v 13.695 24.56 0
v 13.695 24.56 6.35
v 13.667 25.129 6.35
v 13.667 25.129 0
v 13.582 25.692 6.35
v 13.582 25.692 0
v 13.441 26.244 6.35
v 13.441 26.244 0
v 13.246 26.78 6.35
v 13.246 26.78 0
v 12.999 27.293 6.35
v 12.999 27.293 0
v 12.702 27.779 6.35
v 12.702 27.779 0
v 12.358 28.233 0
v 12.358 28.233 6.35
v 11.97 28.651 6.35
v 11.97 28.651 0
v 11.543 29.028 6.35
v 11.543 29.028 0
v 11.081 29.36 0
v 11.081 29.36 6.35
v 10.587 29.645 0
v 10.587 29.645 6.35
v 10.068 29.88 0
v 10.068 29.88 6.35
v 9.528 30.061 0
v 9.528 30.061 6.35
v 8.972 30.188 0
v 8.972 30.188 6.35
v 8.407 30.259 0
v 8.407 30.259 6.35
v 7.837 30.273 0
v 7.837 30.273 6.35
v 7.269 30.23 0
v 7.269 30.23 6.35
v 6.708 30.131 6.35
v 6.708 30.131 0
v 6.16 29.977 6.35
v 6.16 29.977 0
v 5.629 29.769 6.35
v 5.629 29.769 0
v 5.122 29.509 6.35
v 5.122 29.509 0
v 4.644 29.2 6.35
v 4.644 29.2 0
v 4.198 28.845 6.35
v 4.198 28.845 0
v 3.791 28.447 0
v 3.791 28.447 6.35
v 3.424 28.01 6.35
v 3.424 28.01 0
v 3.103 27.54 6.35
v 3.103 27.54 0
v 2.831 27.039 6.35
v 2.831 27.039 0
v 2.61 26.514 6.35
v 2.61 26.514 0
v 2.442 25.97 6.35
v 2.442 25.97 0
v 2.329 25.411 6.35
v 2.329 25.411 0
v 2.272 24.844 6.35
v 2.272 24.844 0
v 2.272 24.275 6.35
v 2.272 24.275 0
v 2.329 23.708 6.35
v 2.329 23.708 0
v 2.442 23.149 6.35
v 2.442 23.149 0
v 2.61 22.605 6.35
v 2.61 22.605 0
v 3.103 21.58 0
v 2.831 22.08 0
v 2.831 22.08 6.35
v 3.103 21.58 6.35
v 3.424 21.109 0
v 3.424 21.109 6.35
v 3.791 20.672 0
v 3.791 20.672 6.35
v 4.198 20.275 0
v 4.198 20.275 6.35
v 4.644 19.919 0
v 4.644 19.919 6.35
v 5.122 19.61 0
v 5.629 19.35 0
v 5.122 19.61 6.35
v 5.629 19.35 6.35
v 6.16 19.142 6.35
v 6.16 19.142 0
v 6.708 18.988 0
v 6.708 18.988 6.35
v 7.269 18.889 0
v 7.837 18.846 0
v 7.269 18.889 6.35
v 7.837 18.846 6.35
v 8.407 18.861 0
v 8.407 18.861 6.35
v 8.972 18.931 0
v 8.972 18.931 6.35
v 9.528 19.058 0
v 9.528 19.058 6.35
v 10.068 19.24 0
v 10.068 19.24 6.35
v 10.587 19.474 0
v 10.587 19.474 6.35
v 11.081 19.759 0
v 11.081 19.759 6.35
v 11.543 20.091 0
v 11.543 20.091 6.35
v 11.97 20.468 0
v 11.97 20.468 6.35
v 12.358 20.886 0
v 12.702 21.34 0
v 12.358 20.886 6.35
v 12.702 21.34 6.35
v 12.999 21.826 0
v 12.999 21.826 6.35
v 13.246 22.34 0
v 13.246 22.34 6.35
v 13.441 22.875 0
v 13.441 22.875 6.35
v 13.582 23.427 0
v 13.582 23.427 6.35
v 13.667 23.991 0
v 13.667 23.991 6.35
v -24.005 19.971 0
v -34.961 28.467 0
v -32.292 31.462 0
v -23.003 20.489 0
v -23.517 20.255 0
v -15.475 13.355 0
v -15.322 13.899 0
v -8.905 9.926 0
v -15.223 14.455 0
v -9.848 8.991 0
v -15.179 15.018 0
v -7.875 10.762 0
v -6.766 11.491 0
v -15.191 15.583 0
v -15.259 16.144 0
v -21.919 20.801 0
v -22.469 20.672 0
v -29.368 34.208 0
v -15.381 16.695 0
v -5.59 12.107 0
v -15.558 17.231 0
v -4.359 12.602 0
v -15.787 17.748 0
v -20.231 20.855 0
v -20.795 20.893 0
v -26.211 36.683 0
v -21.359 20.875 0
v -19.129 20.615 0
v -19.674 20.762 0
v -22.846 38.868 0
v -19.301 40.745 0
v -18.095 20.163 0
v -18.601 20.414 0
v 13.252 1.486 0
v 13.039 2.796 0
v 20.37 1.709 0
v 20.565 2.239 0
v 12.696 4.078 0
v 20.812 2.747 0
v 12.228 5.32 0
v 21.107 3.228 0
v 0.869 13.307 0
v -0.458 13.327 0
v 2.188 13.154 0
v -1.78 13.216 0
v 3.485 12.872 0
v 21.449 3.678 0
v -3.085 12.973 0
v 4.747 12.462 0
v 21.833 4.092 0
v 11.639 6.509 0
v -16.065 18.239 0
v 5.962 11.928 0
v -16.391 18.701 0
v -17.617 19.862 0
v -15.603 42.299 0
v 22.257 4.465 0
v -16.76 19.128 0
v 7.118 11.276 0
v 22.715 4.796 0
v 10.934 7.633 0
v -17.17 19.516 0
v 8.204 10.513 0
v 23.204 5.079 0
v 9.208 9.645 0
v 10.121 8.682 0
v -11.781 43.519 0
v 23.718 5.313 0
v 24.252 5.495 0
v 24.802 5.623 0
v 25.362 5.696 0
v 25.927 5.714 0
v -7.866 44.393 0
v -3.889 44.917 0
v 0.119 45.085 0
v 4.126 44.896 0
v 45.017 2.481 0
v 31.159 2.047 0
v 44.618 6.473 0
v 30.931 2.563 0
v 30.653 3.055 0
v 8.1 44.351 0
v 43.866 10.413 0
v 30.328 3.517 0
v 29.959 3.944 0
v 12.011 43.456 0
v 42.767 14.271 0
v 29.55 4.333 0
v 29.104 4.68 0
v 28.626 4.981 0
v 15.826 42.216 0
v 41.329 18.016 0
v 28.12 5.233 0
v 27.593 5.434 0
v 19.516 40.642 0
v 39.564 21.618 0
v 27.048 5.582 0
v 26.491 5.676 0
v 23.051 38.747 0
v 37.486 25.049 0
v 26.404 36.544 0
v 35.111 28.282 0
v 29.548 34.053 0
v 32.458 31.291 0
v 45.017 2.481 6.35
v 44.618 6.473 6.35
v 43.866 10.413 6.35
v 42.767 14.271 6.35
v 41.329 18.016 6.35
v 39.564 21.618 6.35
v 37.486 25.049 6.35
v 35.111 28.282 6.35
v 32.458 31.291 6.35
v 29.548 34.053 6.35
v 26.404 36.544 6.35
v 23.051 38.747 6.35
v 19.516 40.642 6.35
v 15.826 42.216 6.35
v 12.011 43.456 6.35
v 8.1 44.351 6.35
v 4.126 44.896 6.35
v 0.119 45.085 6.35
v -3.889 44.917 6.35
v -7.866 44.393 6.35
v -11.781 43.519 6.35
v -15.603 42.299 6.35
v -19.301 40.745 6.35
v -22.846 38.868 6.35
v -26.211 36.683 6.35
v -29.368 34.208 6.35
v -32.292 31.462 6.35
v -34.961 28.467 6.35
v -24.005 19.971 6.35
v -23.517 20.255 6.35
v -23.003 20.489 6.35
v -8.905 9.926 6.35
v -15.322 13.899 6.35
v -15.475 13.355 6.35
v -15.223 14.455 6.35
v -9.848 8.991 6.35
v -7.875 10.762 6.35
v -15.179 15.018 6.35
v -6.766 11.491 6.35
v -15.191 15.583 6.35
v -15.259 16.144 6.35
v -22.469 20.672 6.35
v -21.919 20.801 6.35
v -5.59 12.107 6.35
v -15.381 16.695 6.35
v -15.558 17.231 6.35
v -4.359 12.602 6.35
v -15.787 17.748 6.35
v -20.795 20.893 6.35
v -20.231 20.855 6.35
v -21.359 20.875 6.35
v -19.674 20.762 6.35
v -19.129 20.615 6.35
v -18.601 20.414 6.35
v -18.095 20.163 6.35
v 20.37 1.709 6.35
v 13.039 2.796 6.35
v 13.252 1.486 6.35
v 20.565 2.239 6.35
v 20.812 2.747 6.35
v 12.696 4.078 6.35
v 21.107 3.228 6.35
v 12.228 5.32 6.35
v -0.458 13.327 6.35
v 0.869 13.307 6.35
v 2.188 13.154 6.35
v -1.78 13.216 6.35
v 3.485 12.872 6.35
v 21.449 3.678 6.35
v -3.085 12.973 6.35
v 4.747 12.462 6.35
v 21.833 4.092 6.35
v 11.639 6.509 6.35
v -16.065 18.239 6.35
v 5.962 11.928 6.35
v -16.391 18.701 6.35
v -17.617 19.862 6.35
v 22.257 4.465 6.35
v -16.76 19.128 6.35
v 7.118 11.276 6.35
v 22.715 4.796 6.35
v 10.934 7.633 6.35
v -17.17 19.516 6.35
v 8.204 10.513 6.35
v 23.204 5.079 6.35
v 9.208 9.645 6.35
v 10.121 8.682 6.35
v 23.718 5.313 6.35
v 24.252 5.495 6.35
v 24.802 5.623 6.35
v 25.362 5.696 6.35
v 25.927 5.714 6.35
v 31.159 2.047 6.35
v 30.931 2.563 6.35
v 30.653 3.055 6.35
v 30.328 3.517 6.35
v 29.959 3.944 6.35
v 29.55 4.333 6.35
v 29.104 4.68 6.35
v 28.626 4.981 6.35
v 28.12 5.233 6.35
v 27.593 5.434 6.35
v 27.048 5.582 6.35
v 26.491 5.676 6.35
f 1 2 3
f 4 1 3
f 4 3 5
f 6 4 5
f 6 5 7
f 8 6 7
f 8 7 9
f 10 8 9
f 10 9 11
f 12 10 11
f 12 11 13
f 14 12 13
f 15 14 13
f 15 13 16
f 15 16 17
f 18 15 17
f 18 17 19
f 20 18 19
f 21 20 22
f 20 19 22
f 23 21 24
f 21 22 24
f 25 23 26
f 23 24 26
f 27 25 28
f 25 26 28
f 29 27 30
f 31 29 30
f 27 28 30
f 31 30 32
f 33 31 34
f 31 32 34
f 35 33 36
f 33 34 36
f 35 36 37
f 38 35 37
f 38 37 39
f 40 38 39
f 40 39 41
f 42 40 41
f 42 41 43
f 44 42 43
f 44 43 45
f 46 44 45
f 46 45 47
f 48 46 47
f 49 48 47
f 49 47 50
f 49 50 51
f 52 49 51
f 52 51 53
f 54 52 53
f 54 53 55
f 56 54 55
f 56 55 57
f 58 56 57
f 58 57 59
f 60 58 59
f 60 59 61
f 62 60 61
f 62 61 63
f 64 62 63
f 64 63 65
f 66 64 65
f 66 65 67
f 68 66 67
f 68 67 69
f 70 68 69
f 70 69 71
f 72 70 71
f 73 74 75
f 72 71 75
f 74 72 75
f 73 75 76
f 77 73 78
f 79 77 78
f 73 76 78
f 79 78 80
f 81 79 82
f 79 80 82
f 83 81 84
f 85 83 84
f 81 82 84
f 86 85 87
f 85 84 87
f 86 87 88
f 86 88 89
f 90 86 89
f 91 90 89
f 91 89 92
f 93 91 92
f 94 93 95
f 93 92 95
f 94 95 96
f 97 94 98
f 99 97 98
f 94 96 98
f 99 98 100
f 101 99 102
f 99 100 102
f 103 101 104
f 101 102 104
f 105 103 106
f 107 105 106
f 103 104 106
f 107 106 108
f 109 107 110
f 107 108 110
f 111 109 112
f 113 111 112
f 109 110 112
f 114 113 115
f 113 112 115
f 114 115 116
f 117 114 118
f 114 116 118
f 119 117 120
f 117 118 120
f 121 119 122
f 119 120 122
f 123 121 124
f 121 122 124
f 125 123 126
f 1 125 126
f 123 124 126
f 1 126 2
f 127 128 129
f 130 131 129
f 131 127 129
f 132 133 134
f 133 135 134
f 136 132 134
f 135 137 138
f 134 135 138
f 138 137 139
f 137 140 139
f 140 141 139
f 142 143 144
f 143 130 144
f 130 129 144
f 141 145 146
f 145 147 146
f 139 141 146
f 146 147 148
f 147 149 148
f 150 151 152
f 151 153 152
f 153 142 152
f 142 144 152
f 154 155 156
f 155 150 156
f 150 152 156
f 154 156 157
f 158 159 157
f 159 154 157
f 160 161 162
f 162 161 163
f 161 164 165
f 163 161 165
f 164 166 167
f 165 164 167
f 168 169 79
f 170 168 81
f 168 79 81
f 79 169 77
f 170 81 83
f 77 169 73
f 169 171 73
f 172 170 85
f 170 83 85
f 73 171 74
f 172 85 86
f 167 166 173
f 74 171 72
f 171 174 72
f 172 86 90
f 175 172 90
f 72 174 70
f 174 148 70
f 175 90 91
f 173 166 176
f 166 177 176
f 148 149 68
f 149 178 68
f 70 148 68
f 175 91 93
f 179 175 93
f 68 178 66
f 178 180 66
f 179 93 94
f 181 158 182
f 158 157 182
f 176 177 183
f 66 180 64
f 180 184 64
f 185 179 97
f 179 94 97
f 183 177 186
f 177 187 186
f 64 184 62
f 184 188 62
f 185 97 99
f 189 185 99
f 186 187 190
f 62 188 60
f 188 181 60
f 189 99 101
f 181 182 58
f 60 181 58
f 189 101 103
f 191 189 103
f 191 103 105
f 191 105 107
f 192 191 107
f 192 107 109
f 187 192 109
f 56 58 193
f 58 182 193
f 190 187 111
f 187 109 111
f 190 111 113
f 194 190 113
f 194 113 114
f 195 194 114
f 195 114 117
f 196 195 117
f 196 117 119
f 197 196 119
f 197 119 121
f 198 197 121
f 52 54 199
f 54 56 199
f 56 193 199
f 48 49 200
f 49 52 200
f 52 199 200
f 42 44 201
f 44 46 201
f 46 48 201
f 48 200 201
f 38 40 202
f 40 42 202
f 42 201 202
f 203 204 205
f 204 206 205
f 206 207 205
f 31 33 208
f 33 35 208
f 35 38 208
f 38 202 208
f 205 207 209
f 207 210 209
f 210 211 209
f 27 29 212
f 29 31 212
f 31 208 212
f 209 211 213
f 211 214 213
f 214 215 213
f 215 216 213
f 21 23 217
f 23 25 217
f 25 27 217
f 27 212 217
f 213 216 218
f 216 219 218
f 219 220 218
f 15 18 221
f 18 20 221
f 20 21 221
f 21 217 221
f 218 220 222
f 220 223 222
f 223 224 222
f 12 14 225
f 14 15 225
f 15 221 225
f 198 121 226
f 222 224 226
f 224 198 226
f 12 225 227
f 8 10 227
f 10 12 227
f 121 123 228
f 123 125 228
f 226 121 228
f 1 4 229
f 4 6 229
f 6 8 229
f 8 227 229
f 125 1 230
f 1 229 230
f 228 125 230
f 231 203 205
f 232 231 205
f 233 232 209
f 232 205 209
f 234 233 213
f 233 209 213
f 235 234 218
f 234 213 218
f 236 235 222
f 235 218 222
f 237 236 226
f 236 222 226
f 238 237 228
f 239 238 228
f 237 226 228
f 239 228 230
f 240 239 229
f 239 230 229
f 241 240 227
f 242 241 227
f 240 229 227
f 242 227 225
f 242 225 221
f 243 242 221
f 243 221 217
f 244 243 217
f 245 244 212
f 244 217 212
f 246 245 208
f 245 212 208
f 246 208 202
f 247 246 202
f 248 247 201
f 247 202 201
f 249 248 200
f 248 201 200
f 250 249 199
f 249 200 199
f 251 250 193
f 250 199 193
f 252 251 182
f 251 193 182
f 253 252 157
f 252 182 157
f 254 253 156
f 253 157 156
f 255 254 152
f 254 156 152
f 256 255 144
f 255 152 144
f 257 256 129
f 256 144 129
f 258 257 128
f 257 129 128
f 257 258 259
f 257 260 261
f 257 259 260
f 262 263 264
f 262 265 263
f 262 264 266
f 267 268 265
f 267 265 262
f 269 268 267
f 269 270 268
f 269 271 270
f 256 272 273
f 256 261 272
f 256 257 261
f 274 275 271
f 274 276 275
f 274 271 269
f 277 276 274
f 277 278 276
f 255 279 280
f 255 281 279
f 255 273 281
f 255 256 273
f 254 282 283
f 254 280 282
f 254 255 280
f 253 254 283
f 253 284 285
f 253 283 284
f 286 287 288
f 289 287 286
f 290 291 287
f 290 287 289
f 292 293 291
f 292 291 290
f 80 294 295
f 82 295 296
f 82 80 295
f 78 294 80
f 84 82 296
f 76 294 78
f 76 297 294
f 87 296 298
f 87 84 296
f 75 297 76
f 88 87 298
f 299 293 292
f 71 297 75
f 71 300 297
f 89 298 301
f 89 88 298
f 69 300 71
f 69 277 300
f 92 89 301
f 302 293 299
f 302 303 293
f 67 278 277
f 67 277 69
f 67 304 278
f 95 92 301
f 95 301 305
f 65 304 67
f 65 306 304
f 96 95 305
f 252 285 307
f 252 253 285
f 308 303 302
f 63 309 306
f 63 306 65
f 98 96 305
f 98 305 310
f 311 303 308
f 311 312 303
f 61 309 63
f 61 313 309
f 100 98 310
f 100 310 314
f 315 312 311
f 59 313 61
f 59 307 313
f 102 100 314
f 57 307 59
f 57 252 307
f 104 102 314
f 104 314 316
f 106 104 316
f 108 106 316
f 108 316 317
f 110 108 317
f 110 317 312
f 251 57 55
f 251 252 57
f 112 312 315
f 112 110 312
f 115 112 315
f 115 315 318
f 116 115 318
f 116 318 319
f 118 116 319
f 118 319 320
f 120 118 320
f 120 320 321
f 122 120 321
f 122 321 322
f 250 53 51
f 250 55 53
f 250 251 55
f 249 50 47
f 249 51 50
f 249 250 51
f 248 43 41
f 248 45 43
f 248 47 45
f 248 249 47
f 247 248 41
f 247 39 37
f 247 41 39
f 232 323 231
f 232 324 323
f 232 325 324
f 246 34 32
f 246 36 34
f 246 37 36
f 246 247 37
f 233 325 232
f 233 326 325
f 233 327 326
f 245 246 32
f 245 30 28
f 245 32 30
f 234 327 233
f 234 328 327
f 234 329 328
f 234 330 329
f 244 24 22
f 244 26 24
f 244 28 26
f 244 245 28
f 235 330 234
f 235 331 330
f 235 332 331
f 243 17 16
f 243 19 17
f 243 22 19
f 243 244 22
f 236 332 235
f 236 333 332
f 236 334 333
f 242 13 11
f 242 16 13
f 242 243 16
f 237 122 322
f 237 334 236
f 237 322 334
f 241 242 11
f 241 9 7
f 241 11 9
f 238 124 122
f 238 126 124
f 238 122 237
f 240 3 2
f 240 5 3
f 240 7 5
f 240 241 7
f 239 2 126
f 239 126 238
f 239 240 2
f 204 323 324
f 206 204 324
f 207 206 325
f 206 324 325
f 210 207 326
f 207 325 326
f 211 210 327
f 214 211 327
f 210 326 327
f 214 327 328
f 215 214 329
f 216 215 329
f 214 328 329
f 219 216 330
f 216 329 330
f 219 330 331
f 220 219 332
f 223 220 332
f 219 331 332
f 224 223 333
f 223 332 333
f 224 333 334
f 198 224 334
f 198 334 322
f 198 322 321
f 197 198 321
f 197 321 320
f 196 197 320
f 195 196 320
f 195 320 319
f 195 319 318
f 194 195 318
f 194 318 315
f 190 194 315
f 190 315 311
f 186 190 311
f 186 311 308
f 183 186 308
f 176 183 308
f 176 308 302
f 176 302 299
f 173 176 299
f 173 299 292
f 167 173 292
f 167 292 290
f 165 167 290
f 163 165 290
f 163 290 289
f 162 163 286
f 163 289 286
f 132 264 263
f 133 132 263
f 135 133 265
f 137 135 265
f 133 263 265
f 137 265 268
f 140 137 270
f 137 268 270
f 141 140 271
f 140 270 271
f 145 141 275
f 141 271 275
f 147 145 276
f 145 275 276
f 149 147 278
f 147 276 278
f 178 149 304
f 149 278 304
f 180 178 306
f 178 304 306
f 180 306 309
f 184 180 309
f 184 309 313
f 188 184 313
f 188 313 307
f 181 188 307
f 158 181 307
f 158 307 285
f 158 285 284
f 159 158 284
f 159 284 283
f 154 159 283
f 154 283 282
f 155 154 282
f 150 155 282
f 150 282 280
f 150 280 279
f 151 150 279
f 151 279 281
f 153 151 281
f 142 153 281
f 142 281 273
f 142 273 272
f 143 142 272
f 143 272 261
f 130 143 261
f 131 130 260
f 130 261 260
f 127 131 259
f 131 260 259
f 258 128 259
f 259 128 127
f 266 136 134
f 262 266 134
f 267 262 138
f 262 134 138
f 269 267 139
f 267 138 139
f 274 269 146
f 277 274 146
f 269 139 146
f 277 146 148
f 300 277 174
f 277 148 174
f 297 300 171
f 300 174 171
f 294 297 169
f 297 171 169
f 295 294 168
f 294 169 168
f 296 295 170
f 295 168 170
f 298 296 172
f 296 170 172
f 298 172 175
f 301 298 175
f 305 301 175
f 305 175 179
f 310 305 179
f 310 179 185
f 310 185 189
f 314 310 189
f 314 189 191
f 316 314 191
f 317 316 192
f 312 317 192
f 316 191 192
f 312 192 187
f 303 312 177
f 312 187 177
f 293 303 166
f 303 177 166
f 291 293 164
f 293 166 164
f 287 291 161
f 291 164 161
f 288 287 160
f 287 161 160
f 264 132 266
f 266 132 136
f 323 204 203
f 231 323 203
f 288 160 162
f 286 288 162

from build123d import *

# Parameters (mm, degrees)
BOSS_EXTRUDE1_DEPTH = 6.35
SKETCH15_R          = 5.715
CUT_EXTRUDE1_DEPTH  = 65.027197676


with BuildPart() as part:
    # Sketch13 → Boss-Extrude1 (new body)
    with BuildSketch(Plane.XY):
        with BuildLine():
            Line((-34.961025172, 28.467243349), (-9.847867764, 8.991202672))
            ThreePointArc((-9.847867764, 8.991202672), (4.12074162, 12.682338645), (13.251988711, 1.485604323))
            Line((13.251988711, 1.485604323), (45.016689319, 2.480908651))
            ThreePointArc((45.016689319, 2.480908651), (13.932031191, 42.878383037), (-34.961025172, 28.467243349))
        make_face()
    extrude(amount=BOSS_EXTRUDE1_DEPTH)

    # Sketch15 → Cut-Extrude1 (cut, through all)
    with BuildSketch(Plane.XY.offset(6.35)):
        with BuildLine():
            ThreePointArc((-15.475292944, 13.355447276), (-17.389315258, 19.694740336), (-24.005496972, 19.970887857))
            Line((-24.005496972, 19.970887857), (-15.475292944, 13.355447276))
        make_face()
        with Locations((7.979904528, 24.559620794)):
            Circle(SKETCH15_R)
        with BuildLine():
            ThreePointArc((31.159448366, 2.046710575), (25.644529482, 5.712196576), (20.369909931, 1.708634847))
            Line((20.369909931, 1.708634847), (31.159448366, 2.046710575))
        make_face()
    extrude(amount=-CUT_EXTRUDE1_DEPTH, mode=Mode.SUBTRACT)


solid = part.part
